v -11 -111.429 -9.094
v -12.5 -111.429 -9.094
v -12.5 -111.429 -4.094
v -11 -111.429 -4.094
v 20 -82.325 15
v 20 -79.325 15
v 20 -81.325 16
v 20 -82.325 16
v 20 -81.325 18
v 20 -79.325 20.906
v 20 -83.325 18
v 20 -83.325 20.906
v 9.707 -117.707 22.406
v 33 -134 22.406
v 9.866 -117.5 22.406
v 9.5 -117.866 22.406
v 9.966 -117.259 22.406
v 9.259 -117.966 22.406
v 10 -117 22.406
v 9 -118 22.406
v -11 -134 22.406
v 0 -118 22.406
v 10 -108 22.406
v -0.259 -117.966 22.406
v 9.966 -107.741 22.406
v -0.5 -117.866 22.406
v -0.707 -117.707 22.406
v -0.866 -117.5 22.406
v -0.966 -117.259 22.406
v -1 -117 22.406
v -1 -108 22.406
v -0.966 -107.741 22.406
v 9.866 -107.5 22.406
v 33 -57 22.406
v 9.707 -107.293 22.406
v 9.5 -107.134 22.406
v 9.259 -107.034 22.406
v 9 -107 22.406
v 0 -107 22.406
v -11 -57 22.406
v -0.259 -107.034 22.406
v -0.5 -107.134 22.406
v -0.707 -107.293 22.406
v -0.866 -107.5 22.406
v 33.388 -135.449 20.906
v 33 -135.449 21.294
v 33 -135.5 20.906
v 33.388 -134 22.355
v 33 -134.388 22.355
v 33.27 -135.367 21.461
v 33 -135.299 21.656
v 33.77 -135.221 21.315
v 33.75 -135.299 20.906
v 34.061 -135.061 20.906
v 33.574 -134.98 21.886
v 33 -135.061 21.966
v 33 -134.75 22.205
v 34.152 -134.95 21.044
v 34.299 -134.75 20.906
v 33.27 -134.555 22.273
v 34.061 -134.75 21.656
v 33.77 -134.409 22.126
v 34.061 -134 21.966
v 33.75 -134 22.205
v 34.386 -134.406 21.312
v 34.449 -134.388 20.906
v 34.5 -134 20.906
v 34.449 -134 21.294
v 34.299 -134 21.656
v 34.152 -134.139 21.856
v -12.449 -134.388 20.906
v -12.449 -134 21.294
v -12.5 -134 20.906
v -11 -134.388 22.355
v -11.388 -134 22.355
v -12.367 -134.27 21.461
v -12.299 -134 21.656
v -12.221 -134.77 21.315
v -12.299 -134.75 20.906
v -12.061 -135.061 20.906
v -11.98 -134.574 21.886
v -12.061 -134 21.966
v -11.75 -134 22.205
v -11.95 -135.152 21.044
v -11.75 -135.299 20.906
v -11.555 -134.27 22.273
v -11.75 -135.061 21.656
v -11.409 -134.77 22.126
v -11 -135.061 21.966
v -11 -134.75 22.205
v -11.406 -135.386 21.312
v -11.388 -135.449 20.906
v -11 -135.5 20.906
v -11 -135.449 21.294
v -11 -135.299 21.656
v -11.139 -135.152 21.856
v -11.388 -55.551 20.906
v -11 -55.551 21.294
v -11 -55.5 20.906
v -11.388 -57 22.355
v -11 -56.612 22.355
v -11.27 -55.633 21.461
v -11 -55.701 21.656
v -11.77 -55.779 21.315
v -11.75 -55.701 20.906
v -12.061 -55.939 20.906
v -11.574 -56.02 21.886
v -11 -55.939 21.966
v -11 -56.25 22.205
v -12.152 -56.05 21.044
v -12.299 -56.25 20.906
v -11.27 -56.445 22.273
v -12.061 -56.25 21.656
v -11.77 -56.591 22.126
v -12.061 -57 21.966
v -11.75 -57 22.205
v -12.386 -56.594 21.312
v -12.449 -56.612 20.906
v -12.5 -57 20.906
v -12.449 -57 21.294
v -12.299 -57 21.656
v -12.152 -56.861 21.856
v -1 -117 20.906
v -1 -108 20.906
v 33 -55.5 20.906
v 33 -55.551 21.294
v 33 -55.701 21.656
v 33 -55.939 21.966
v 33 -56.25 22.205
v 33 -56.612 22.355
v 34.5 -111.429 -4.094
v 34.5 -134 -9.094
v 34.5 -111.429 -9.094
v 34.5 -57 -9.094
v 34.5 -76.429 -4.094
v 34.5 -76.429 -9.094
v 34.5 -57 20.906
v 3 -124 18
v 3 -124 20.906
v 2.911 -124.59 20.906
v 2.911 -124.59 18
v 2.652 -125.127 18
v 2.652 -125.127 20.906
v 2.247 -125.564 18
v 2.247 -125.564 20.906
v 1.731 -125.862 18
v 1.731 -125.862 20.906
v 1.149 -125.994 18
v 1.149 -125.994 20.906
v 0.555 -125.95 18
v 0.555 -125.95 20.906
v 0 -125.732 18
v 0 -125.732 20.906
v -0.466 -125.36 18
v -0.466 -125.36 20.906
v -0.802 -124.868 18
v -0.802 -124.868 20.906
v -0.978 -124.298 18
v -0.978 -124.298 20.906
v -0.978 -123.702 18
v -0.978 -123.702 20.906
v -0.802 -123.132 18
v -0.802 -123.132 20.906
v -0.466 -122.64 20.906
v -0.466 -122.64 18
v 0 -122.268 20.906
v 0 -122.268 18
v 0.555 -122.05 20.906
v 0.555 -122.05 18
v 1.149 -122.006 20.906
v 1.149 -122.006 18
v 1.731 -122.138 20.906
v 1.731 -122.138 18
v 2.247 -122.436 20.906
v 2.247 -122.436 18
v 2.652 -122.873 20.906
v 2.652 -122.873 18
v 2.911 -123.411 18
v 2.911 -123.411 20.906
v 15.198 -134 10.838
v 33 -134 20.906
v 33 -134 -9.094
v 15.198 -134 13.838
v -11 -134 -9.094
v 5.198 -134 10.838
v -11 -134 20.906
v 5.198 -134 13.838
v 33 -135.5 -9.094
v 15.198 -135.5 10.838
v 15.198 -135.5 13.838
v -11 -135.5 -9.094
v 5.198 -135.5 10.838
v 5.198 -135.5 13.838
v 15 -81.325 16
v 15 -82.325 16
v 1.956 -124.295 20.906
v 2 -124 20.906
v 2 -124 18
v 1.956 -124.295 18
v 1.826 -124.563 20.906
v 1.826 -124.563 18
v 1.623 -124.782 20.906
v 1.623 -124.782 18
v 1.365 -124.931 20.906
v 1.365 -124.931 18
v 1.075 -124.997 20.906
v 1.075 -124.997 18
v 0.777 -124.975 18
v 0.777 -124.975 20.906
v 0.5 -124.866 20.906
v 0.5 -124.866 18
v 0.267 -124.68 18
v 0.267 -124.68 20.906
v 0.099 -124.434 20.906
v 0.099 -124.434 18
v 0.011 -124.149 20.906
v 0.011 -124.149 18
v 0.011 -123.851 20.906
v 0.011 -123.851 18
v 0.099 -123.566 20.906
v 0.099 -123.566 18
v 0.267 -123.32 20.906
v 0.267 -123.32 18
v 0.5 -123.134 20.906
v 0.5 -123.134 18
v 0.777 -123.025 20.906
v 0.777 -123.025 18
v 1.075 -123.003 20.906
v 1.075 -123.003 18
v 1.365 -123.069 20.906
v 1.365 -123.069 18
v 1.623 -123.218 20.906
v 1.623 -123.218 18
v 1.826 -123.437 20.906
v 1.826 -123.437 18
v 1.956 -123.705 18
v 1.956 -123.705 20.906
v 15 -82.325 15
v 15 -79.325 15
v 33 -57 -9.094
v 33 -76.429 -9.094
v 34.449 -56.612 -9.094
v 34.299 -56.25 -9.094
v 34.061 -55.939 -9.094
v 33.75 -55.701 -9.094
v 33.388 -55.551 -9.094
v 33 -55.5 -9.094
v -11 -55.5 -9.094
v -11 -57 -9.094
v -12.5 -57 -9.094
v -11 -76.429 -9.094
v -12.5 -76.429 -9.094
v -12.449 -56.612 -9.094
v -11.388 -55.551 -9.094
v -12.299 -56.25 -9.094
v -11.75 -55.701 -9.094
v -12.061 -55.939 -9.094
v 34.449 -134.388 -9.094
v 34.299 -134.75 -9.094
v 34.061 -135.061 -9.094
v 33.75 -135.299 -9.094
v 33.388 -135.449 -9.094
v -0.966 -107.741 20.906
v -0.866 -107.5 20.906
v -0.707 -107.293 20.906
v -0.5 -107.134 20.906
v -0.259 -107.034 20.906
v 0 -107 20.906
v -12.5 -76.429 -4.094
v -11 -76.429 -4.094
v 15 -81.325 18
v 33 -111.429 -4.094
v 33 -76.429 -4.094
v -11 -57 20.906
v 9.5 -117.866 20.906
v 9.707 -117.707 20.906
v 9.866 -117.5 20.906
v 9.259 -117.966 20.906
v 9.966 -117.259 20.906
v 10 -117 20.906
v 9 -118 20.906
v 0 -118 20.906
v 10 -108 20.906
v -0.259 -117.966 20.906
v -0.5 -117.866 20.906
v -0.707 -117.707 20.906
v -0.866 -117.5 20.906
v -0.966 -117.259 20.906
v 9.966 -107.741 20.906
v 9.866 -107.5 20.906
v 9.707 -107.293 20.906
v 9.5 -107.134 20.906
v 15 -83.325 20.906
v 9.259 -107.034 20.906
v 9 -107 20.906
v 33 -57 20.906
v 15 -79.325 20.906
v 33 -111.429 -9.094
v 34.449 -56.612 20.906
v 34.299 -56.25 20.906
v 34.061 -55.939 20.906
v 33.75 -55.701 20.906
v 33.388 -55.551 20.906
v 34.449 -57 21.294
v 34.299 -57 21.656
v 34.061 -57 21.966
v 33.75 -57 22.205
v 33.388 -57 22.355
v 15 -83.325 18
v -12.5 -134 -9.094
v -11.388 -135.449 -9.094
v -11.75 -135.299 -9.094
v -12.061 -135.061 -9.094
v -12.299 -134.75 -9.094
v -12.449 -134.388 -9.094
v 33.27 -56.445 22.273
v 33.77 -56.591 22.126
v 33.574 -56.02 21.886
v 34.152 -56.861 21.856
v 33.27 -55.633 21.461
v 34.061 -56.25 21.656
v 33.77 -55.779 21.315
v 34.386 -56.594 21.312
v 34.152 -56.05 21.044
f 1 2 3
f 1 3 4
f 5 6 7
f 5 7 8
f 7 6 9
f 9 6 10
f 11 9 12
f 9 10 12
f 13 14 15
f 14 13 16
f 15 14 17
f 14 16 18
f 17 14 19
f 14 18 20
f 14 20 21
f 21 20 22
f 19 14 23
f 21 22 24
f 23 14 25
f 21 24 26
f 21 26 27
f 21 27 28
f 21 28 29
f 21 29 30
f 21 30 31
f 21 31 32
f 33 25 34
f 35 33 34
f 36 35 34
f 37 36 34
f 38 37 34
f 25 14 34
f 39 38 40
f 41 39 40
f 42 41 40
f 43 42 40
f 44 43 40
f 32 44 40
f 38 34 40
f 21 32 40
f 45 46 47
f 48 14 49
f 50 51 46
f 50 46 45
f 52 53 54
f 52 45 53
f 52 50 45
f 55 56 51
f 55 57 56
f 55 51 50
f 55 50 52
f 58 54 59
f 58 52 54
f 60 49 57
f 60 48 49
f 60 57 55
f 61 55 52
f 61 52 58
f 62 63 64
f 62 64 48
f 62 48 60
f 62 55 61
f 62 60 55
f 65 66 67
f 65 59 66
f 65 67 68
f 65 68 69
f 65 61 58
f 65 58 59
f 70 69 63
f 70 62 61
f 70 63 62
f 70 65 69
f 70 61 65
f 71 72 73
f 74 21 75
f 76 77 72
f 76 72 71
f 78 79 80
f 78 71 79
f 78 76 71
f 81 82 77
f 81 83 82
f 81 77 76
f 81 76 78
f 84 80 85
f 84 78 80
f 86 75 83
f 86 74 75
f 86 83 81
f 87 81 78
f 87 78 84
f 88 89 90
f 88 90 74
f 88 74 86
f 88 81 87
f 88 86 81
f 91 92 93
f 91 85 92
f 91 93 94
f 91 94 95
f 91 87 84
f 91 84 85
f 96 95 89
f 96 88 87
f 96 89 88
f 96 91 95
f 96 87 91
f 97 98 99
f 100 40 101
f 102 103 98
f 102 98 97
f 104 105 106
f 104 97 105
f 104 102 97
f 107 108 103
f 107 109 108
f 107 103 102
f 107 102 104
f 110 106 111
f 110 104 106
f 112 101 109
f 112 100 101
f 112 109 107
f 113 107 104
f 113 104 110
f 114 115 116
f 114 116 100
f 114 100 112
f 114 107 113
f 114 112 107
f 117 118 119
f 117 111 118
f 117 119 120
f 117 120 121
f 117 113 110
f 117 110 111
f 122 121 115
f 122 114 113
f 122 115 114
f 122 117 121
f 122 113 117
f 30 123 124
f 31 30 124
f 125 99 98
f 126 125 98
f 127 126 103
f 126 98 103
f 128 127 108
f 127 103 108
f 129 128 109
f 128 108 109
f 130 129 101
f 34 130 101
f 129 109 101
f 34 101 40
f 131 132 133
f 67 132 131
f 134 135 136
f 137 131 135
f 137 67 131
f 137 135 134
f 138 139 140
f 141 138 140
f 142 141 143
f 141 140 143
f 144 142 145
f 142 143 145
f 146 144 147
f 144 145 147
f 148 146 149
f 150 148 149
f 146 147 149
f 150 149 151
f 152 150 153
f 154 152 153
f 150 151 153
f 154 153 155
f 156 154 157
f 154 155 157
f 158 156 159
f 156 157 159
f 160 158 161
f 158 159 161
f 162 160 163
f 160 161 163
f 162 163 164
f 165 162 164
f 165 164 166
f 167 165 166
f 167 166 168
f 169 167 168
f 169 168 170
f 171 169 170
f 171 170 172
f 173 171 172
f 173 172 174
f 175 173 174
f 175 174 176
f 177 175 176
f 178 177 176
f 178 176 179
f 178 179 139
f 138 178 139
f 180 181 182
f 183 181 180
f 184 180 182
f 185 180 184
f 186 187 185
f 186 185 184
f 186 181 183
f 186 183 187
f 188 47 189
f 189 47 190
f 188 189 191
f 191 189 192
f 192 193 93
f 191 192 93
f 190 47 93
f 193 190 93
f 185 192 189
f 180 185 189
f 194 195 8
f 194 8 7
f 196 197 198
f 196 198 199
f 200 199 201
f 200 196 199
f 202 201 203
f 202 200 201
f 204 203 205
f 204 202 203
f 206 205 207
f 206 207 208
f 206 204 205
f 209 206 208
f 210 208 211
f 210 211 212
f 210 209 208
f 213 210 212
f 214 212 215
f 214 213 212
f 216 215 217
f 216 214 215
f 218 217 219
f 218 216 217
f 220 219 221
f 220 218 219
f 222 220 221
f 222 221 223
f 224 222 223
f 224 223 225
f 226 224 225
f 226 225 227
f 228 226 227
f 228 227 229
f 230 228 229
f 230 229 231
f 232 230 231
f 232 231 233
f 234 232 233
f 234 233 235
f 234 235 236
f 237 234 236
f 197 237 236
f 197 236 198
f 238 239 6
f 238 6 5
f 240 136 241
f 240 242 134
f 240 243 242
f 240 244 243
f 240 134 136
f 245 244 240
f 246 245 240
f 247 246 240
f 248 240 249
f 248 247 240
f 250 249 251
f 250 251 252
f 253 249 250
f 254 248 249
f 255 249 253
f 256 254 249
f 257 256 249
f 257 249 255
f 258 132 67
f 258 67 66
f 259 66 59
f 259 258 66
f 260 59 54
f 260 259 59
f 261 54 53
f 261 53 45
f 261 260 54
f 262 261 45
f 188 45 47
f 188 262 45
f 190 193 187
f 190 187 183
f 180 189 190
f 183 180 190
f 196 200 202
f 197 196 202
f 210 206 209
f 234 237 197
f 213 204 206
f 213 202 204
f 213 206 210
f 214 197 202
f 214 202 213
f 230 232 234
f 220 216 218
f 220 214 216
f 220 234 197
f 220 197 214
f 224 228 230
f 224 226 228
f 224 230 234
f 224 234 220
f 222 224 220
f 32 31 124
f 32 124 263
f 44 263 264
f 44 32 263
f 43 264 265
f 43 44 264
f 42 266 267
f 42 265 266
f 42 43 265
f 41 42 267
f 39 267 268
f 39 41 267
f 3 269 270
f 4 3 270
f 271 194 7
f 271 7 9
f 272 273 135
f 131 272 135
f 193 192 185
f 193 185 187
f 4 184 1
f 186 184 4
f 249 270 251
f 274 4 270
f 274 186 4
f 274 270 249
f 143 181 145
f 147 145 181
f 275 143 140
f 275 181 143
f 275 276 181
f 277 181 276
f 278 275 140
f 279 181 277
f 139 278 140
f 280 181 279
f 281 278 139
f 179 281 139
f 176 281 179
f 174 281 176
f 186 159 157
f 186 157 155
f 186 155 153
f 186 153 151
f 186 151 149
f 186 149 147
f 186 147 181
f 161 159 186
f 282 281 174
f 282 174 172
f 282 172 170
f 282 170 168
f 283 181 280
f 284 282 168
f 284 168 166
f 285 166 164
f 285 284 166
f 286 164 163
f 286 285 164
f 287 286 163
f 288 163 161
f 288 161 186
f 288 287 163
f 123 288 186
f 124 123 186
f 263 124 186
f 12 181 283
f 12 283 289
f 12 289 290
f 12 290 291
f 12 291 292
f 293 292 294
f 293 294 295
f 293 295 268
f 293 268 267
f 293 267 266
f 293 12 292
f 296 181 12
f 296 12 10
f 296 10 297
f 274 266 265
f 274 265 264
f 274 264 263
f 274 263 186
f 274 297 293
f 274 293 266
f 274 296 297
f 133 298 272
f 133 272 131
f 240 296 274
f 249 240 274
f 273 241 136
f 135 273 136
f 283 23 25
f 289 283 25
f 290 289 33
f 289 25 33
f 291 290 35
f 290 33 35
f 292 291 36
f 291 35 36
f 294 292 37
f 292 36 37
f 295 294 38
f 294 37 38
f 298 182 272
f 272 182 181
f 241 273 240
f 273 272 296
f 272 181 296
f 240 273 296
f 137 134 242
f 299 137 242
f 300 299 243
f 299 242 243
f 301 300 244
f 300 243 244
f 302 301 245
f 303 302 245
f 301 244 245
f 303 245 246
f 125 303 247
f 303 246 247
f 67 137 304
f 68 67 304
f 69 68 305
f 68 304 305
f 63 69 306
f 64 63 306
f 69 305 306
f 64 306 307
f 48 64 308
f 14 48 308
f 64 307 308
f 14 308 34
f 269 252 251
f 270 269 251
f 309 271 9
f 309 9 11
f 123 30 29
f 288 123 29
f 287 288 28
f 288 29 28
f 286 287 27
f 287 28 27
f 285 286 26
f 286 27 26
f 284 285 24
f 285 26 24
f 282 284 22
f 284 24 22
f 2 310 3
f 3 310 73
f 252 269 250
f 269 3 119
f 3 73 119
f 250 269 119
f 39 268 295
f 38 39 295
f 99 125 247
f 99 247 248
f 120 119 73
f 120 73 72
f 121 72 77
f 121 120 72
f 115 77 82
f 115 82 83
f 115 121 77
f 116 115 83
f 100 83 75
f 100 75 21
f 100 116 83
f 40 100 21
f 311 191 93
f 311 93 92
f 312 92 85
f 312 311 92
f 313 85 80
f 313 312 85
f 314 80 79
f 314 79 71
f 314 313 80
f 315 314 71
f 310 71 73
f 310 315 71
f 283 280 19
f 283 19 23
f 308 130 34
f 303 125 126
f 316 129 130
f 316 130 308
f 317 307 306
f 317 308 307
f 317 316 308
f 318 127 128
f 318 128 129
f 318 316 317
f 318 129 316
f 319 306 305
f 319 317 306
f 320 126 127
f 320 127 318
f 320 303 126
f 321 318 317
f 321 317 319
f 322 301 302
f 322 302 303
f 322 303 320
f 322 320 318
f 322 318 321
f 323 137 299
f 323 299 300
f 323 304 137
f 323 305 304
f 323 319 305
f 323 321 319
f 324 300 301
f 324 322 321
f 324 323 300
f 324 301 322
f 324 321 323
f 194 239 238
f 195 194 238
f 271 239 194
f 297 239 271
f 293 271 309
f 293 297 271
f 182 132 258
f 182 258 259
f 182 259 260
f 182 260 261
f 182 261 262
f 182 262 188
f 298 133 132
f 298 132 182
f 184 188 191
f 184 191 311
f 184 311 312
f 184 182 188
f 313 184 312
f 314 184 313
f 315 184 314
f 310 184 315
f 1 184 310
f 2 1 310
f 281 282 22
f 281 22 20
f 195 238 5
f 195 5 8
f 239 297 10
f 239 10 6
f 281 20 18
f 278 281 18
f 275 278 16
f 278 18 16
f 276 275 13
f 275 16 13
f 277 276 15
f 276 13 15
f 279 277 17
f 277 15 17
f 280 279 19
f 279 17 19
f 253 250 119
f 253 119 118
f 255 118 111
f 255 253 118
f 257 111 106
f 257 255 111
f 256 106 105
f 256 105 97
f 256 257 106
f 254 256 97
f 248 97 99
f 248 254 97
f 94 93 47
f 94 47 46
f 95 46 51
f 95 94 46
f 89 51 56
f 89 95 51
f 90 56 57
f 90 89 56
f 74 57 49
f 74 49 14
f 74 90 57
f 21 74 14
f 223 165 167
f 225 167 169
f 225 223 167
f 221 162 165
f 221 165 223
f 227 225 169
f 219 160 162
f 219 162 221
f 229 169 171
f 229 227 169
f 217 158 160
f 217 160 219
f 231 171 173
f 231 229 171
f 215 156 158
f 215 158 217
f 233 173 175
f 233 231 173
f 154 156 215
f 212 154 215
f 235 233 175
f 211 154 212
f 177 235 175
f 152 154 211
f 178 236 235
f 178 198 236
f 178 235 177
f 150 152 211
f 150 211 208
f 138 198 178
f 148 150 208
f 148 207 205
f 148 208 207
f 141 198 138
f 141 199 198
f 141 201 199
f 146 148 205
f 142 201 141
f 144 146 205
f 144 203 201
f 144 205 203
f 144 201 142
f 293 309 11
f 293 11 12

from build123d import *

# Parameters (mm, degrees)
SKETCH011_AS_DRAWN_W                 = 10
SKETCH011_AS_DRAWN_H                 = 3
EXTRUDE005_DEPTH                     = 10
EXTRUDE005_ONTO_SKETCH011_ROLL_ANGLE = 90
BOX_W                                = 11
BOX_H                                = 11
BOX_DEPTH                            = 10
FILLET001_R                          = 1
SKETCH007_W                          = 62.8586
SKETCH007_H                          = 35
EXTRUDE003_DEPTH                     = 5
CYLINDER_R                           = 2
CYLINDER_DEPTH                       = 40
SKETCH003_W                          = 44
SKETCH003_H                          = 77
PAD_DEPTH                            = 30
THICKNESS_T                          = 1.5
SKETCH005_R                          = 2
SKETCH005_R_2                        = 1
PAD001_DEPTH                         = 3
EXTRUDE004_DEPTH                     = 5


with BuildPart() as extrude005:
    # Sketch011 as drawn → Extrude005 (new)
    with BuildSketch(Plane.XY):
        with Locations((10.197845, 12.338122)):
            Rectangle(SKETCH011_AS_DRAWN_W, SKETCH011_AS_DRAWN_H)
    extrude(amount=-EXTRUDE005_DEPTH)


with BuildPart() as extrude005_1:
    # Extrude005 onto Sketch011 roll: moved
    add(extrude005.part.rotate(Axis((0, 0, 0), (1, 0, 0)), EXTRUDE005_ONTO_SKETCH011_ROLL_ANGLE))


with BuildPart() as extrude005_2:
    # Extrude005 onto Sketch011 placement: moved
    add(extrude005_1.part.moved(Location((0, -139, 0))))


with BuildPart() as fillet001:
    # Box → Box (new body)
    with BuildSketch(Plane.XY):
        with Locations((5.5, 5.5)):
            Rectangle(BOX_W, BOX_H)
    extrude(amount=BOX_DEPTH)

    # Fillet001
    fillet001_edges = [fillet001.edges().sort_by_distance(p)[0] for p in [
        (0, 0, 5),
        (0, 11, 5),
        (11, 0, 5),
        (11, 11, 5),
    ]]
    fillet(fillet001_edges, radius=FILLET001_R)


with BuildPart() as fillet001_1:
    # Fillet001 placement: moved
    add(fillet001.part.moved(Location((-1, -118, 14))))


with BuildPart() as extrude003:
    # Sketch007 → Extrude003 (new body)
    with BuildSketch(Plane.XY):
        with Locations((11.4293, -93.929395)):
            Rectangle(SKETCH007_W, SKETCH007_H)
    extrude(amount=EXTRUDE003_DEPTH)


with BuildPart() as cilindro:
    # Cylinder → Cylinder (new body)
    with BuildSketch(Plane(origin=(-29, 21, -2), x_dir=(1, 0, 0), z_dir=(0, 0, 1))):
        Circle(CYLINDER_R)
    extrude(amount=CYLINDER_DEPTH)


with BuildPart() as cut:
    # Sketch003 → Pad (new body)
    with BuildSketch(Plane(origin=(0, 0, 0), x_dir=(-1, 0, 0), z_dir=(0, 0, -1))):
        with Locations((22, 38.5)):
            Rectangle(SKETCH003_W, SKETCH003_H)
    extrude(amount=PAD_DEPTH)

    # Thickness
    thickness_openings = [cut.faces().sort_by_distance(p)[0] for p in [
        (-22, 38.5, -30),
    ]]
    offset(amount=THICKNESS_T, openings=thickness_openings)


with BuildPart() as cut_1:
    # Thickness placement: moved
    add(cut.part.moved(Location((9e-06, 2.6e-05, 20.905646))))

    # Cut: cut Cilindro
    add(cilindro.part, mode=Mode.SUBTRACT)


with BuildPart() as cut003:
    # Sketch005 → Pad001 (new body)
    with BuildSketch(Plane(origin=(0, 0, 21), x_dir=(1, 0, 0), z_dir=(0, 0, -1))):
        with Locations((-32, -10)):
            Circle(SKETCH005_R)
        with Locations((-32, -10)):
            Circle(SKETCH005_R_2, mode=Mode.SUBTRACT)
    extrude(amount=PAD001_DEPTH)

    # Fusion: union Cut
    add(cut_1.part)


with BuildPart() as cut003_1:
    # Fusion placement: moved
    add(cut003.part.moved(Location((32.999991, -134.000034, 9.094354))))

    # Cut001: cut Extrude003
    add(extrude003.part, mode=Mode.SUBTRACT)


with BuildPart() as cut003_2:
    # Cut001 placement: moved
    add(cut003_1.part.moved(Location((0, 0, -9.094209))))

    # Cut002: cut Fillet001
    add(fillet001_1.part, mode=Mode.SUBTRACT)

    # Cut003: cut Extrude005
    add(extrude005_2.part, mode=Mode.SUBTRACT)


with BuildPart() as fusion002:
    # Sketch009 → Extrude004 (new body)
    with BuildSketch(Plane.YZ.offset(15)):
        Polygon((-79.324959, 21), (-79.324959, 15), (-82.324959, 15), (-82.324959, 16), (-81.324959, 16), (-81.324959, 18), (-83.324959, 18), (-83.324959, 21), align=None)
    extrude(amount=EXTRUDE004_DEPTH)

    # Fusion002: union Cut003
    add(cut003_2.part)


solid = fusion002.part
